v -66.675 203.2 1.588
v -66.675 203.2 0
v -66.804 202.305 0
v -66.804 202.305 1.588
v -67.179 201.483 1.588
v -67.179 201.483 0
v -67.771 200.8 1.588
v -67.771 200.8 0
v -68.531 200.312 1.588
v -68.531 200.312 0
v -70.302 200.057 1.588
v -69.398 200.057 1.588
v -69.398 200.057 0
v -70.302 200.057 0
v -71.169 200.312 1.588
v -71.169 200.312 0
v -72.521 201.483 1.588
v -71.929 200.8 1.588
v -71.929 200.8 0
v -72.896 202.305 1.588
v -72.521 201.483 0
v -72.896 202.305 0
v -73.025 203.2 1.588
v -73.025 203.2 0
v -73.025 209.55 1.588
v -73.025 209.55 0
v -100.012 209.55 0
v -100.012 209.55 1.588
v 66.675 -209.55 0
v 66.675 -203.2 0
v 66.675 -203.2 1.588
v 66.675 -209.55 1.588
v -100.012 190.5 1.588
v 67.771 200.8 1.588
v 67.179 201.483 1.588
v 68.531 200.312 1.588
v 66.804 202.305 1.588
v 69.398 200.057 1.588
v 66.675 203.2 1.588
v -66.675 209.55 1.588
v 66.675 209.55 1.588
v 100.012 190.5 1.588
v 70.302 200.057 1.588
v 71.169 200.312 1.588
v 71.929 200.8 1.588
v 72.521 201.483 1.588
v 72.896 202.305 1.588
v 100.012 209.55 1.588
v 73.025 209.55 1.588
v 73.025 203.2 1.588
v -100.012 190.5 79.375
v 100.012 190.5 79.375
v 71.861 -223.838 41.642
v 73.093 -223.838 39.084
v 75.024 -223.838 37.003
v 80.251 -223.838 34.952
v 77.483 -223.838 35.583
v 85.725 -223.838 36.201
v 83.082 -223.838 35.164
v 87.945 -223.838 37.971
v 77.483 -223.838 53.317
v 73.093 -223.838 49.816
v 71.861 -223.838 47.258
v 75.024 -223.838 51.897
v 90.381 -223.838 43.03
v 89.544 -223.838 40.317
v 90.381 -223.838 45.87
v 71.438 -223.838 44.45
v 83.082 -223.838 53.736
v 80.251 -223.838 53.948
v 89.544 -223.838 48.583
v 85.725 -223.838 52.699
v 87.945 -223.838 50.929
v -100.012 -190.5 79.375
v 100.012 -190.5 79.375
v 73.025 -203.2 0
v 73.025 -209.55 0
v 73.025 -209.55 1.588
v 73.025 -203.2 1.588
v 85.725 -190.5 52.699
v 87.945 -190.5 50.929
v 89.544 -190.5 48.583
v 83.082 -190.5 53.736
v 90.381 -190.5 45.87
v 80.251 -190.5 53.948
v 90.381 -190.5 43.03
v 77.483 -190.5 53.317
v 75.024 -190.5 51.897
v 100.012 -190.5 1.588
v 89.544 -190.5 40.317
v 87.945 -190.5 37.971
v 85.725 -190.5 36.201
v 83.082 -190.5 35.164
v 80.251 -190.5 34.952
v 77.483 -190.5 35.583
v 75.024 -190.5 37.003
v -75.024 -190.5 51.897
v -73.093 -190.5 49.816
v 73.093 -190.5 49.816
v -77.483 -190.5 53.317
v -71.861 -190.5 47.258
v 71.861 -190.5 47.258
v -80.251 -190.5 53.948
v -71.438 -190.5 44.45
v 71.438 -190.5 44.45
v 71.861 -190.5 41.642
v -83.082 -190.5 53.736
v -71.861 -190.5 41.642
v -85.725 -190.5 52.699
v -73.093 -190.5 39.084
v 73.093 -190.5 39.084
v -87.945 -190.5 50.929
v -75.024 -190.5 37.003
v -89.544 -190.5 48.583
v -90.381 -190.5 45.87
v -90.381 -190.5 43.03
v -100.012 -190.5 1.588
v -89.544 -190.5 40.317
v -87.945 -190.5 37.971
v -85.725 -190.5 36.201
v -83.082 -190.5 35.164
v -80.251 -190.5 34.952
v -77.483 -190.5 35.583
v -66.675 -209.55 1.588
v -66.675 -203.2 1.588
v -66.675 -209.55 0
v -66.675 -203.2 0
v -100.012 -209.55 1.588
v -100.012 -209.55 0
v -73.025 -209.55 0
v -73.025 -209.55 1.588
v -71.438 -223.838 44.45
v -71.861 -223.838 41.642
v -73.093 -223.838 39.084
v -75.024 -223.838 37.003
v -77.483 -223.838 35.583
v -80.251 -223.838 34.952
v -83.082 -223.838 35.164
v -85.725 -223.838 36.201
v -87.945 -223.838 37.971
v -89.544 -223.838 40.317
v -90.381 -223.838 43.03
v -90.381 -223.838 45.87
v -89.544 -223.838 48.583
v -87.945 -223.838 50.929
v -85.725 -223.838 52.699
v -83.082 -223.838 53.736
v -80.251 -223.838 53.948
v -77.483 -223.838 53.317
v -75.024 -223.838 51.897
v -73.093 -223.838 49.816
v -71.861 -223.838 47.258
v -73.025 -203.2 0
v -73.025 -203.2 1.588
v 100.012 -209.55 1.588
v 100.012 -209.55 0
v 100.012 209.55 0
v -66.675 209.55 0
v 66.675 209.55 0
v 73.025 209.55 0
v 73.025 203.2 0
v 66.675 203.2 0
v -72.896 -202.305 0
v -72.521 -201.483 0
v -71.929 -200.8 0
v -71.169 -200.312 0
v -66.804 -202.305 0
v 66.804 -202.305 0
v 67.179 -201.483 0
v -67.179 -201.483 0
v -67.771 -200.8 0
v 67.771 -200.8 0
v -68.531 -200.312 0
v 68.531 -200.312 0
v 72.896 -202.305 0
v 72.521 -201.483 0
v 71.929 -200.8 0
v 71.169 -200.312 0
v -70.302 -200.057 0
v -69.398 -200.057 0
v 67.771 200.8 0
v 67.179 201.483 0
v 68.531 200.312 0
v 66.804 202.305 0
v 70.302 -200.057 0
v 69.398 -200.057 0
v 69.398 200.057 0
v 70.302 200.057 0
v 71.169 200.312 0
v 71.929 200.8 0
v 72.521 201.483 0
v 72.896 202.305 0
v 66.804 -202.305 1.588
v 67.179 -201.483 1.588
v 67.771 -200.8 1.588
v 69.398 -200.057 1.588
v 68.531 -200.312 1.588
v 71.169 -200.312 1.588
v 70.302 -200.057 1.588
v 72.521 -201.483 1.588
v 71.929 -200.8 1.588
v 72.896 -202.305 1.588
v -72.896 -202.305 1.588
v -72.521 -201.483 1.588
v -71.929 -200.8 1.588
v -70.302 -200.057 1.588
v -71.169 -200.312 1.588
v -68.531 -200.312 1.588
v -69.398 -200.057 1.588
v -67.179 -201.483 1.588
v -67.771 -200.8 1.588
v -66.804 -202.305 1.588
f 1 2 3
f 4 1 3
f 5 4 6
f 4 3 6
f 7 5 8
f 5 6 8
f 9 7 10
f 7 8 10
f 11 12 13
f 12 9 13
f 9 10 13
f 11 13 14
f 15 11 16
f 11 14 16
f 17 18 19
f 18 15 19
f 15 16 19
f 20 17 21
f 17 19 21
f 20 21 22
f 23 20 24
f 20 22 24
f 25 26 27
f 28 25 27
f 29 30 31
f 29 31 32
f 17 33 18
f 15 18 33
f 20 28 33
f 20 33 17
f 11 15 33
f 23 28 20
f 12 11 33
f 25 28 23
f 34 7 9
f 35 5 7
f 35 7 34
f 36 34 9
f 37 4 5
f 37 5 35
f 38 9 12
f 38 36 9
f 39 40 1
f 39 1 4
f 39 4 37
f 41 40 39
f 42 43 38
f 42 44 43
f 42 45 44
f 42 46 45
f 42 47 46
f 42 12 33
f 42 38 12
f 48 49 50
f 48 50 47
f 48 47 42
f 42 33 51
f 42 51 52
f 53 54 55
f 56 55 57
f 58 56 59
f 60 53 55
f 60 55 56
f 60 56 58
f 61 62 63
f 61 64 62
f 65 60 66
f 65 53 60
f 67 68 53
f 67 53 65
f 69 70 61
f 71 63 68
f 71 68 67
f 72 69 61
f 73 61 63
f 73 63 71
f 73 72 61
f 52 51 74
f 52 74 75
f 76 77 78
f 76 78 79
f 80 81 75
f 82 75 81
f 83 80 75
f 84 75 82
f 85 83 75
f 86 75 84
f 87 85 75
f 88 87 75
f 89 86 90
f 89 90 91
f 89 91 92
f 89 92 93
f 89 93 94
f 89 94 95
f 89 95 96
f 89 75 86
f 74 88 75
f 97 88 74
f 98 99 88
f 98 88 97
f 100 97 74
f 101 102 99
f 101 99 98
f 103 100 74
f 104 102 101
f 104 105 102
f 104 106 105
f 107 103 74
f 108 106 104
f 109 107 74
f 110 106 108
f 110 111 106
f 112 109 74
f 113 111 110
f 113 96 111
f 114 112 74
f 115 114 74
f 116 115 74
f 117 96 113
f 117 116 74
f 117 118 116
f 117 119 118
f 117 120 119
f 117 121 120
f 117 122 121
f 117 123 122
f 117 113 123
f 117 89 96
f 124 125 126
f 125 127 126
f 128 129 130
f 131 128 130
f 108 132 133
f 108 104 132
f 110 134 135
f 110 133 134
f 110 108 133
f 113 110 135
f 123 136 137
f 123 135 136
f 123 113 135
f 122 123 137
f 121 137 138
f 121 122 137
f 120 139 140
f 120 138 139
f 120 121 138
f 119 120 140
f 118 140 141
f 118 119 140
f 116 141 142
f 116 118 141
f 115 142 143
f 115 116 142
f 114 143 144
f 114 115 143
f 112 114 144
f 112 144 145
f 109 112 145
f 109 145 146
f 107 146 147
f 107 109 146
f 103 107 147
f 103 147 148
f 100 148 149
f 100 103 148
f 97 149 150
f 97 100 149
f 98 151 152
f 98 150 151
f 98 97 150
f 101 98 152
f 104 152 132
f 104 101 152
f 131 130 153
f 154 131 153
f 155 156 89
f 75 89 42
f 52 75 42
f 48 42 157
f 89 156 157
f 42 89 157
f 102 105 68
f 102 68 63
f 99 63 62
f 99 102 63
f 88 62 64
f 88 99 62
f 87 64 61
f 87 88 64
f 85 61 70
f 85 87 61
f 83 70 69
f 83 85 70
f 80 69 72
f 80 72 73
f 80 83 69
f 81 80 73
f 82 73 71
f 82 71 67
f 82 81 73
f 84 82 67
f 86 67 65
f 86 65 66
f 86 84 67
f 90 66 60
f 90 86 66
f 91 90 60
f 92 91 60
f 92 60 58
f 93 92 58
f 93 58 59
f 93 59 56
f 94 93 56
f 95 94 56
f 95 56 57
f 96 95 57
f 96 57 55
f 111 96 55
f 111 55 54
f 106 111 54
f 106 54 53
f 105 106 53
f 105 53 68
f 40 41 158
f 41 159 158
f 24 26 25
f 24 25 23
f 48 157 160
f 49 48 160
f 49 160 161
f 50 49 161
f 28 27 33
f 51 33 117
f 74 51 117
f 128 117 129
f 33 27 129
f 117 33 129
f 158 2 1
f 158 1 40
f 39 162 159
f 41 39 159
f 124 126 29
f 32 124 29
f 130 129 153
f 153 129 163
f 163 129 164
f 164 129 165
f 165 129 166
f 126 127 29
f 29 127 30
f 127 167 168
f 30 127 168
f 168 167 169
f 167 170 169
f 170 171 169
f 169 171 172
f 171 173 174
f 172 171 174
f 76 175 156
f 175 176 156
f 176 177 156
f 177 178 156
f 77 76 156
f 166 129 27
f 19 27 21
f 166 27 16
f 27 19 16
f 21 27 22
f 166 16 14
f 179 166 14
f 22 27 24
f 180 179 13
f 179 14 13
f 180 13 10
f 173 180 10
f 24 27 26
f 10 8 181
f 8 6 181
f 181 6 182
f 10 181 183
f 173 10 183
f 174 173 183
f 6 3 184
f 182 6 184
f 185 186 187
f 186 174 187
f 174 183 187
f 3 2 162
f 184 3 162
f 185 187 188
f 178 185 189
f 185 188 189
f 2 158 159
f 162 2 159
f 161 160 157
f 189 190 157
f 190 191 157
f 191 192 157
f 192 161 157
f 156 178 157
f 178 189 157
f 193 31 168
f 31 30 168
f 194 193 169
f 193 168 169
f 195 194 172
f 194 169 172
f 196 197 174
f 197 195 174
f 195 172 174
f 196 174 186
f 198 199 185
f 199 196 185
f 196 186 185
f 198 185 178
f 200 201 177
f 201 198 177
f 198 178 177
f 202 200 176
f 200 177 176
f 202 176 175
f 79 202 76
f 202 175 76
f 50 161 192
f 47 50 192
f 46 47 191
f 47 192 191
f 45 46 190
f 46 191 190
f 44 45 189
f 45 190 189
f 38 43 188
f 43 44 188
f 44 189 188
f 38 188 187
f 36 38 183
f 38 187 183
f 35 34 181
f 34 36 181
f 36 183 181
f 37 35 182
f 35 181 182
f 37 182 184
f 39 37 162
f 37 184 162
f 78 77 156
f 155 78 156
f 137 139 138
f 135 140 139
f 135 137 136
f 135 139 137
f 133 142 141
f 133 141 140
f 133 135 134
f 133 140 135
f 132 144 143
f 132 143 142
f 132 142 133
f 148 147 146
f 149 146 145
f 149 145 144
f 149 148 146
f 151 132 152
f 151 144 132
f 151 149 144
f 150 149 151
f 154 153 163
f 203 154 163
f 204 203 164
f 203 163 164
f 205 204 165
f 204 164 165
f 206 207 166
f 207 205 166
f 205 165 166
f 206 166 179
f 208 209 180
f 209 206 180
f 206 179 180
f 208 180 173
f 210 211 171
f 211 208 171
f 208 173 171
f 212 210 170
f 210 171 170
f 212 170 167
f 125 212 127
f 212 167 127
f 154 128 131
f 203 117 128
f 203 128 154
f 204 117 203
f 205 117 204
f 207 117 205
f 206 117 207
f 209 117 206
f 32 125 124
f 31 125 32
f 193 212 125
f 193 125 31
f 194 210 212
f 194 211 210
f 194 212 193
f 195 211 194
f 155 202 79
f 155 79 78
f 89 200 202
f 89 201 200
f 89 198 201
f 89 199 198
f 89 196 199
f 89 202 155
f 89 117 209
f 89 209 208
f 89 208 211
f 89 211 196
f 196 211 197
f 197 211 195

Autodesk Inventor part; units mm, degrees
ref_plane "YZ Plane" through (0, 0, 0) normal (1, 0, 0) x (0, 1, 0)
ref_plane "XZ Plane" through (0, 0, 0) normal (0, 1, 0) x (-1, 0, 0)
ref_plane "XY Plane" through (0, 0, 0) normal (0, 0, 1) x (1, 0, 0)
sketch "Sketch1" plane through (0, 0, 0) normal (0, 0, 1) x (1, 0, 0)
  line L0 (-100.0125, -209.55) -> (100.0125, -209.55)
  line L1 (100.0125, -209.55) -> (100.0125, 209.55)
  line L2 (100.0125, 209.55) -> (-100.0125, 209.55)
  line L3 (-100.0125, 209.55) -> (-100.0125, -209.55)
  circle A0 centre (69.85, 203.2) radius 3.175
  line L4 (66.675, 209.55) -> (73.025, 209.55)
  line L5 (73.025, 209.55) -> (73.025, 203.2)
  line L6 (73.025, 203.2) -> (66.675, 203.2)
  line L7 (66.675, 203.2) -> (66.675, 209.55)
  line L8 (0, 209.55) -> (0, -209.55)
  line L9 (100.0125, 0) -> (-100.0125, 0)
  circle A1 centre (-69.85, 203.2) radius 3.175
  line L10 (-66.675, 209.55) -> (-73.025, 209.55)
  line L11 (-73.025, 209.55) -> (-73.025, 203.2)
  line L12 (-73.025, 203.2) -> (-66.675, 203.2)
  line L13 (-66.675, 203.2) -> (-66.675, 209.55)
  circle A2 centre (69.85, -203.2) radius 3.175
  line L14 (66.675, -209.55) -> (73.025, -209.55)
  line L15 (73.025, -209.55) -> (73.025, -203.2)
  line L16 (73.025, -203.2) -> (66.675, -203.2)
  line L17 (66.675, -203.2) -> (66.675, -209.55)
  circle A3 centre (-69.85, -203.2) radius 3.175
  line L18 (-66.675, -209.55) -> (-73.025, -209.55)
  line L19 (-73.025, -209.55) -> (-73.025, -203.2)
  line L20 (-73.025, -203.2) -> (-66.675, -203.2)
  line L21 (-66.675, -203.2) -> (-66.675, -209.55)
  point P0 (0, 0)
  point P1 (0, 0)
  dimension "d0" = 419.1
  dimension "d1" = 200.025
  dimension "d2" = 6.35
  dimension "d3" = 6.35
  dimension "d4" = 30.1625
extrude "Extrusion1" add sketch "Sketch1" along normal blind 1.5875 contours L3 L9 L8 L0 L21 A3 L19 | L3 L2 L11 A1 L13 L8 L9 | L9 L1 L0 L15 A2 L17 L8 | L8 L2 L7 A0 L5 L1 L9
sketch "Sketch2" plane through (0, 0, 1.5875) normal (0, 0, 1) x (1, 0, 0)
  line L0 (100.0125, 209.55) -> (100.0125, -209.55) projected
  line L1 (-100.0125, -209.55) -> (-100.0125, 209.55) projected
  line L2 (-100.0125, 190.5) -> (100.0125, 190.5)
  line L3 (100.0125, 190.5) -> (100.0125, -190.5)
  line L4 (100.0125, -190.5) -> (-100.0125, -190.5)
  line L5 (-100.0125, -190.5) -> (-100.0125, 190.5)
  point P0 (0, 0)
  point P1 (-100.0125, 0)
  dimension "d7" = 381
extrude "Extrusion2" add sketch "Sketch2" along normal blind 77.7875
sketch "Sketch3" plane through (-100.0125, -190.5, 1.5875) normal (0, -1, 0) x (1, 0, 0)
  line L0 (0, 0) -> (0, 77.7875) projected
  circle A0 centre (19.05, 42.8625) radius 9.525
  line L1 (0, -1.5875) -> (26.9875, -1.5875) projected
  point P0 (100.0125, -1.5875)
  dimension "d10" = 19.05
  dimension "d11" = 44.45
  dimension "d12" = 19.05
extrude "Extrusion3" add sketch "Sketch3" along normal blind 33.3375
mirror "Mirror1" about plane through (0, 0, 0) normal (1, 0, 0) of "Extrusion3"
properties part number "2kW inverter"
